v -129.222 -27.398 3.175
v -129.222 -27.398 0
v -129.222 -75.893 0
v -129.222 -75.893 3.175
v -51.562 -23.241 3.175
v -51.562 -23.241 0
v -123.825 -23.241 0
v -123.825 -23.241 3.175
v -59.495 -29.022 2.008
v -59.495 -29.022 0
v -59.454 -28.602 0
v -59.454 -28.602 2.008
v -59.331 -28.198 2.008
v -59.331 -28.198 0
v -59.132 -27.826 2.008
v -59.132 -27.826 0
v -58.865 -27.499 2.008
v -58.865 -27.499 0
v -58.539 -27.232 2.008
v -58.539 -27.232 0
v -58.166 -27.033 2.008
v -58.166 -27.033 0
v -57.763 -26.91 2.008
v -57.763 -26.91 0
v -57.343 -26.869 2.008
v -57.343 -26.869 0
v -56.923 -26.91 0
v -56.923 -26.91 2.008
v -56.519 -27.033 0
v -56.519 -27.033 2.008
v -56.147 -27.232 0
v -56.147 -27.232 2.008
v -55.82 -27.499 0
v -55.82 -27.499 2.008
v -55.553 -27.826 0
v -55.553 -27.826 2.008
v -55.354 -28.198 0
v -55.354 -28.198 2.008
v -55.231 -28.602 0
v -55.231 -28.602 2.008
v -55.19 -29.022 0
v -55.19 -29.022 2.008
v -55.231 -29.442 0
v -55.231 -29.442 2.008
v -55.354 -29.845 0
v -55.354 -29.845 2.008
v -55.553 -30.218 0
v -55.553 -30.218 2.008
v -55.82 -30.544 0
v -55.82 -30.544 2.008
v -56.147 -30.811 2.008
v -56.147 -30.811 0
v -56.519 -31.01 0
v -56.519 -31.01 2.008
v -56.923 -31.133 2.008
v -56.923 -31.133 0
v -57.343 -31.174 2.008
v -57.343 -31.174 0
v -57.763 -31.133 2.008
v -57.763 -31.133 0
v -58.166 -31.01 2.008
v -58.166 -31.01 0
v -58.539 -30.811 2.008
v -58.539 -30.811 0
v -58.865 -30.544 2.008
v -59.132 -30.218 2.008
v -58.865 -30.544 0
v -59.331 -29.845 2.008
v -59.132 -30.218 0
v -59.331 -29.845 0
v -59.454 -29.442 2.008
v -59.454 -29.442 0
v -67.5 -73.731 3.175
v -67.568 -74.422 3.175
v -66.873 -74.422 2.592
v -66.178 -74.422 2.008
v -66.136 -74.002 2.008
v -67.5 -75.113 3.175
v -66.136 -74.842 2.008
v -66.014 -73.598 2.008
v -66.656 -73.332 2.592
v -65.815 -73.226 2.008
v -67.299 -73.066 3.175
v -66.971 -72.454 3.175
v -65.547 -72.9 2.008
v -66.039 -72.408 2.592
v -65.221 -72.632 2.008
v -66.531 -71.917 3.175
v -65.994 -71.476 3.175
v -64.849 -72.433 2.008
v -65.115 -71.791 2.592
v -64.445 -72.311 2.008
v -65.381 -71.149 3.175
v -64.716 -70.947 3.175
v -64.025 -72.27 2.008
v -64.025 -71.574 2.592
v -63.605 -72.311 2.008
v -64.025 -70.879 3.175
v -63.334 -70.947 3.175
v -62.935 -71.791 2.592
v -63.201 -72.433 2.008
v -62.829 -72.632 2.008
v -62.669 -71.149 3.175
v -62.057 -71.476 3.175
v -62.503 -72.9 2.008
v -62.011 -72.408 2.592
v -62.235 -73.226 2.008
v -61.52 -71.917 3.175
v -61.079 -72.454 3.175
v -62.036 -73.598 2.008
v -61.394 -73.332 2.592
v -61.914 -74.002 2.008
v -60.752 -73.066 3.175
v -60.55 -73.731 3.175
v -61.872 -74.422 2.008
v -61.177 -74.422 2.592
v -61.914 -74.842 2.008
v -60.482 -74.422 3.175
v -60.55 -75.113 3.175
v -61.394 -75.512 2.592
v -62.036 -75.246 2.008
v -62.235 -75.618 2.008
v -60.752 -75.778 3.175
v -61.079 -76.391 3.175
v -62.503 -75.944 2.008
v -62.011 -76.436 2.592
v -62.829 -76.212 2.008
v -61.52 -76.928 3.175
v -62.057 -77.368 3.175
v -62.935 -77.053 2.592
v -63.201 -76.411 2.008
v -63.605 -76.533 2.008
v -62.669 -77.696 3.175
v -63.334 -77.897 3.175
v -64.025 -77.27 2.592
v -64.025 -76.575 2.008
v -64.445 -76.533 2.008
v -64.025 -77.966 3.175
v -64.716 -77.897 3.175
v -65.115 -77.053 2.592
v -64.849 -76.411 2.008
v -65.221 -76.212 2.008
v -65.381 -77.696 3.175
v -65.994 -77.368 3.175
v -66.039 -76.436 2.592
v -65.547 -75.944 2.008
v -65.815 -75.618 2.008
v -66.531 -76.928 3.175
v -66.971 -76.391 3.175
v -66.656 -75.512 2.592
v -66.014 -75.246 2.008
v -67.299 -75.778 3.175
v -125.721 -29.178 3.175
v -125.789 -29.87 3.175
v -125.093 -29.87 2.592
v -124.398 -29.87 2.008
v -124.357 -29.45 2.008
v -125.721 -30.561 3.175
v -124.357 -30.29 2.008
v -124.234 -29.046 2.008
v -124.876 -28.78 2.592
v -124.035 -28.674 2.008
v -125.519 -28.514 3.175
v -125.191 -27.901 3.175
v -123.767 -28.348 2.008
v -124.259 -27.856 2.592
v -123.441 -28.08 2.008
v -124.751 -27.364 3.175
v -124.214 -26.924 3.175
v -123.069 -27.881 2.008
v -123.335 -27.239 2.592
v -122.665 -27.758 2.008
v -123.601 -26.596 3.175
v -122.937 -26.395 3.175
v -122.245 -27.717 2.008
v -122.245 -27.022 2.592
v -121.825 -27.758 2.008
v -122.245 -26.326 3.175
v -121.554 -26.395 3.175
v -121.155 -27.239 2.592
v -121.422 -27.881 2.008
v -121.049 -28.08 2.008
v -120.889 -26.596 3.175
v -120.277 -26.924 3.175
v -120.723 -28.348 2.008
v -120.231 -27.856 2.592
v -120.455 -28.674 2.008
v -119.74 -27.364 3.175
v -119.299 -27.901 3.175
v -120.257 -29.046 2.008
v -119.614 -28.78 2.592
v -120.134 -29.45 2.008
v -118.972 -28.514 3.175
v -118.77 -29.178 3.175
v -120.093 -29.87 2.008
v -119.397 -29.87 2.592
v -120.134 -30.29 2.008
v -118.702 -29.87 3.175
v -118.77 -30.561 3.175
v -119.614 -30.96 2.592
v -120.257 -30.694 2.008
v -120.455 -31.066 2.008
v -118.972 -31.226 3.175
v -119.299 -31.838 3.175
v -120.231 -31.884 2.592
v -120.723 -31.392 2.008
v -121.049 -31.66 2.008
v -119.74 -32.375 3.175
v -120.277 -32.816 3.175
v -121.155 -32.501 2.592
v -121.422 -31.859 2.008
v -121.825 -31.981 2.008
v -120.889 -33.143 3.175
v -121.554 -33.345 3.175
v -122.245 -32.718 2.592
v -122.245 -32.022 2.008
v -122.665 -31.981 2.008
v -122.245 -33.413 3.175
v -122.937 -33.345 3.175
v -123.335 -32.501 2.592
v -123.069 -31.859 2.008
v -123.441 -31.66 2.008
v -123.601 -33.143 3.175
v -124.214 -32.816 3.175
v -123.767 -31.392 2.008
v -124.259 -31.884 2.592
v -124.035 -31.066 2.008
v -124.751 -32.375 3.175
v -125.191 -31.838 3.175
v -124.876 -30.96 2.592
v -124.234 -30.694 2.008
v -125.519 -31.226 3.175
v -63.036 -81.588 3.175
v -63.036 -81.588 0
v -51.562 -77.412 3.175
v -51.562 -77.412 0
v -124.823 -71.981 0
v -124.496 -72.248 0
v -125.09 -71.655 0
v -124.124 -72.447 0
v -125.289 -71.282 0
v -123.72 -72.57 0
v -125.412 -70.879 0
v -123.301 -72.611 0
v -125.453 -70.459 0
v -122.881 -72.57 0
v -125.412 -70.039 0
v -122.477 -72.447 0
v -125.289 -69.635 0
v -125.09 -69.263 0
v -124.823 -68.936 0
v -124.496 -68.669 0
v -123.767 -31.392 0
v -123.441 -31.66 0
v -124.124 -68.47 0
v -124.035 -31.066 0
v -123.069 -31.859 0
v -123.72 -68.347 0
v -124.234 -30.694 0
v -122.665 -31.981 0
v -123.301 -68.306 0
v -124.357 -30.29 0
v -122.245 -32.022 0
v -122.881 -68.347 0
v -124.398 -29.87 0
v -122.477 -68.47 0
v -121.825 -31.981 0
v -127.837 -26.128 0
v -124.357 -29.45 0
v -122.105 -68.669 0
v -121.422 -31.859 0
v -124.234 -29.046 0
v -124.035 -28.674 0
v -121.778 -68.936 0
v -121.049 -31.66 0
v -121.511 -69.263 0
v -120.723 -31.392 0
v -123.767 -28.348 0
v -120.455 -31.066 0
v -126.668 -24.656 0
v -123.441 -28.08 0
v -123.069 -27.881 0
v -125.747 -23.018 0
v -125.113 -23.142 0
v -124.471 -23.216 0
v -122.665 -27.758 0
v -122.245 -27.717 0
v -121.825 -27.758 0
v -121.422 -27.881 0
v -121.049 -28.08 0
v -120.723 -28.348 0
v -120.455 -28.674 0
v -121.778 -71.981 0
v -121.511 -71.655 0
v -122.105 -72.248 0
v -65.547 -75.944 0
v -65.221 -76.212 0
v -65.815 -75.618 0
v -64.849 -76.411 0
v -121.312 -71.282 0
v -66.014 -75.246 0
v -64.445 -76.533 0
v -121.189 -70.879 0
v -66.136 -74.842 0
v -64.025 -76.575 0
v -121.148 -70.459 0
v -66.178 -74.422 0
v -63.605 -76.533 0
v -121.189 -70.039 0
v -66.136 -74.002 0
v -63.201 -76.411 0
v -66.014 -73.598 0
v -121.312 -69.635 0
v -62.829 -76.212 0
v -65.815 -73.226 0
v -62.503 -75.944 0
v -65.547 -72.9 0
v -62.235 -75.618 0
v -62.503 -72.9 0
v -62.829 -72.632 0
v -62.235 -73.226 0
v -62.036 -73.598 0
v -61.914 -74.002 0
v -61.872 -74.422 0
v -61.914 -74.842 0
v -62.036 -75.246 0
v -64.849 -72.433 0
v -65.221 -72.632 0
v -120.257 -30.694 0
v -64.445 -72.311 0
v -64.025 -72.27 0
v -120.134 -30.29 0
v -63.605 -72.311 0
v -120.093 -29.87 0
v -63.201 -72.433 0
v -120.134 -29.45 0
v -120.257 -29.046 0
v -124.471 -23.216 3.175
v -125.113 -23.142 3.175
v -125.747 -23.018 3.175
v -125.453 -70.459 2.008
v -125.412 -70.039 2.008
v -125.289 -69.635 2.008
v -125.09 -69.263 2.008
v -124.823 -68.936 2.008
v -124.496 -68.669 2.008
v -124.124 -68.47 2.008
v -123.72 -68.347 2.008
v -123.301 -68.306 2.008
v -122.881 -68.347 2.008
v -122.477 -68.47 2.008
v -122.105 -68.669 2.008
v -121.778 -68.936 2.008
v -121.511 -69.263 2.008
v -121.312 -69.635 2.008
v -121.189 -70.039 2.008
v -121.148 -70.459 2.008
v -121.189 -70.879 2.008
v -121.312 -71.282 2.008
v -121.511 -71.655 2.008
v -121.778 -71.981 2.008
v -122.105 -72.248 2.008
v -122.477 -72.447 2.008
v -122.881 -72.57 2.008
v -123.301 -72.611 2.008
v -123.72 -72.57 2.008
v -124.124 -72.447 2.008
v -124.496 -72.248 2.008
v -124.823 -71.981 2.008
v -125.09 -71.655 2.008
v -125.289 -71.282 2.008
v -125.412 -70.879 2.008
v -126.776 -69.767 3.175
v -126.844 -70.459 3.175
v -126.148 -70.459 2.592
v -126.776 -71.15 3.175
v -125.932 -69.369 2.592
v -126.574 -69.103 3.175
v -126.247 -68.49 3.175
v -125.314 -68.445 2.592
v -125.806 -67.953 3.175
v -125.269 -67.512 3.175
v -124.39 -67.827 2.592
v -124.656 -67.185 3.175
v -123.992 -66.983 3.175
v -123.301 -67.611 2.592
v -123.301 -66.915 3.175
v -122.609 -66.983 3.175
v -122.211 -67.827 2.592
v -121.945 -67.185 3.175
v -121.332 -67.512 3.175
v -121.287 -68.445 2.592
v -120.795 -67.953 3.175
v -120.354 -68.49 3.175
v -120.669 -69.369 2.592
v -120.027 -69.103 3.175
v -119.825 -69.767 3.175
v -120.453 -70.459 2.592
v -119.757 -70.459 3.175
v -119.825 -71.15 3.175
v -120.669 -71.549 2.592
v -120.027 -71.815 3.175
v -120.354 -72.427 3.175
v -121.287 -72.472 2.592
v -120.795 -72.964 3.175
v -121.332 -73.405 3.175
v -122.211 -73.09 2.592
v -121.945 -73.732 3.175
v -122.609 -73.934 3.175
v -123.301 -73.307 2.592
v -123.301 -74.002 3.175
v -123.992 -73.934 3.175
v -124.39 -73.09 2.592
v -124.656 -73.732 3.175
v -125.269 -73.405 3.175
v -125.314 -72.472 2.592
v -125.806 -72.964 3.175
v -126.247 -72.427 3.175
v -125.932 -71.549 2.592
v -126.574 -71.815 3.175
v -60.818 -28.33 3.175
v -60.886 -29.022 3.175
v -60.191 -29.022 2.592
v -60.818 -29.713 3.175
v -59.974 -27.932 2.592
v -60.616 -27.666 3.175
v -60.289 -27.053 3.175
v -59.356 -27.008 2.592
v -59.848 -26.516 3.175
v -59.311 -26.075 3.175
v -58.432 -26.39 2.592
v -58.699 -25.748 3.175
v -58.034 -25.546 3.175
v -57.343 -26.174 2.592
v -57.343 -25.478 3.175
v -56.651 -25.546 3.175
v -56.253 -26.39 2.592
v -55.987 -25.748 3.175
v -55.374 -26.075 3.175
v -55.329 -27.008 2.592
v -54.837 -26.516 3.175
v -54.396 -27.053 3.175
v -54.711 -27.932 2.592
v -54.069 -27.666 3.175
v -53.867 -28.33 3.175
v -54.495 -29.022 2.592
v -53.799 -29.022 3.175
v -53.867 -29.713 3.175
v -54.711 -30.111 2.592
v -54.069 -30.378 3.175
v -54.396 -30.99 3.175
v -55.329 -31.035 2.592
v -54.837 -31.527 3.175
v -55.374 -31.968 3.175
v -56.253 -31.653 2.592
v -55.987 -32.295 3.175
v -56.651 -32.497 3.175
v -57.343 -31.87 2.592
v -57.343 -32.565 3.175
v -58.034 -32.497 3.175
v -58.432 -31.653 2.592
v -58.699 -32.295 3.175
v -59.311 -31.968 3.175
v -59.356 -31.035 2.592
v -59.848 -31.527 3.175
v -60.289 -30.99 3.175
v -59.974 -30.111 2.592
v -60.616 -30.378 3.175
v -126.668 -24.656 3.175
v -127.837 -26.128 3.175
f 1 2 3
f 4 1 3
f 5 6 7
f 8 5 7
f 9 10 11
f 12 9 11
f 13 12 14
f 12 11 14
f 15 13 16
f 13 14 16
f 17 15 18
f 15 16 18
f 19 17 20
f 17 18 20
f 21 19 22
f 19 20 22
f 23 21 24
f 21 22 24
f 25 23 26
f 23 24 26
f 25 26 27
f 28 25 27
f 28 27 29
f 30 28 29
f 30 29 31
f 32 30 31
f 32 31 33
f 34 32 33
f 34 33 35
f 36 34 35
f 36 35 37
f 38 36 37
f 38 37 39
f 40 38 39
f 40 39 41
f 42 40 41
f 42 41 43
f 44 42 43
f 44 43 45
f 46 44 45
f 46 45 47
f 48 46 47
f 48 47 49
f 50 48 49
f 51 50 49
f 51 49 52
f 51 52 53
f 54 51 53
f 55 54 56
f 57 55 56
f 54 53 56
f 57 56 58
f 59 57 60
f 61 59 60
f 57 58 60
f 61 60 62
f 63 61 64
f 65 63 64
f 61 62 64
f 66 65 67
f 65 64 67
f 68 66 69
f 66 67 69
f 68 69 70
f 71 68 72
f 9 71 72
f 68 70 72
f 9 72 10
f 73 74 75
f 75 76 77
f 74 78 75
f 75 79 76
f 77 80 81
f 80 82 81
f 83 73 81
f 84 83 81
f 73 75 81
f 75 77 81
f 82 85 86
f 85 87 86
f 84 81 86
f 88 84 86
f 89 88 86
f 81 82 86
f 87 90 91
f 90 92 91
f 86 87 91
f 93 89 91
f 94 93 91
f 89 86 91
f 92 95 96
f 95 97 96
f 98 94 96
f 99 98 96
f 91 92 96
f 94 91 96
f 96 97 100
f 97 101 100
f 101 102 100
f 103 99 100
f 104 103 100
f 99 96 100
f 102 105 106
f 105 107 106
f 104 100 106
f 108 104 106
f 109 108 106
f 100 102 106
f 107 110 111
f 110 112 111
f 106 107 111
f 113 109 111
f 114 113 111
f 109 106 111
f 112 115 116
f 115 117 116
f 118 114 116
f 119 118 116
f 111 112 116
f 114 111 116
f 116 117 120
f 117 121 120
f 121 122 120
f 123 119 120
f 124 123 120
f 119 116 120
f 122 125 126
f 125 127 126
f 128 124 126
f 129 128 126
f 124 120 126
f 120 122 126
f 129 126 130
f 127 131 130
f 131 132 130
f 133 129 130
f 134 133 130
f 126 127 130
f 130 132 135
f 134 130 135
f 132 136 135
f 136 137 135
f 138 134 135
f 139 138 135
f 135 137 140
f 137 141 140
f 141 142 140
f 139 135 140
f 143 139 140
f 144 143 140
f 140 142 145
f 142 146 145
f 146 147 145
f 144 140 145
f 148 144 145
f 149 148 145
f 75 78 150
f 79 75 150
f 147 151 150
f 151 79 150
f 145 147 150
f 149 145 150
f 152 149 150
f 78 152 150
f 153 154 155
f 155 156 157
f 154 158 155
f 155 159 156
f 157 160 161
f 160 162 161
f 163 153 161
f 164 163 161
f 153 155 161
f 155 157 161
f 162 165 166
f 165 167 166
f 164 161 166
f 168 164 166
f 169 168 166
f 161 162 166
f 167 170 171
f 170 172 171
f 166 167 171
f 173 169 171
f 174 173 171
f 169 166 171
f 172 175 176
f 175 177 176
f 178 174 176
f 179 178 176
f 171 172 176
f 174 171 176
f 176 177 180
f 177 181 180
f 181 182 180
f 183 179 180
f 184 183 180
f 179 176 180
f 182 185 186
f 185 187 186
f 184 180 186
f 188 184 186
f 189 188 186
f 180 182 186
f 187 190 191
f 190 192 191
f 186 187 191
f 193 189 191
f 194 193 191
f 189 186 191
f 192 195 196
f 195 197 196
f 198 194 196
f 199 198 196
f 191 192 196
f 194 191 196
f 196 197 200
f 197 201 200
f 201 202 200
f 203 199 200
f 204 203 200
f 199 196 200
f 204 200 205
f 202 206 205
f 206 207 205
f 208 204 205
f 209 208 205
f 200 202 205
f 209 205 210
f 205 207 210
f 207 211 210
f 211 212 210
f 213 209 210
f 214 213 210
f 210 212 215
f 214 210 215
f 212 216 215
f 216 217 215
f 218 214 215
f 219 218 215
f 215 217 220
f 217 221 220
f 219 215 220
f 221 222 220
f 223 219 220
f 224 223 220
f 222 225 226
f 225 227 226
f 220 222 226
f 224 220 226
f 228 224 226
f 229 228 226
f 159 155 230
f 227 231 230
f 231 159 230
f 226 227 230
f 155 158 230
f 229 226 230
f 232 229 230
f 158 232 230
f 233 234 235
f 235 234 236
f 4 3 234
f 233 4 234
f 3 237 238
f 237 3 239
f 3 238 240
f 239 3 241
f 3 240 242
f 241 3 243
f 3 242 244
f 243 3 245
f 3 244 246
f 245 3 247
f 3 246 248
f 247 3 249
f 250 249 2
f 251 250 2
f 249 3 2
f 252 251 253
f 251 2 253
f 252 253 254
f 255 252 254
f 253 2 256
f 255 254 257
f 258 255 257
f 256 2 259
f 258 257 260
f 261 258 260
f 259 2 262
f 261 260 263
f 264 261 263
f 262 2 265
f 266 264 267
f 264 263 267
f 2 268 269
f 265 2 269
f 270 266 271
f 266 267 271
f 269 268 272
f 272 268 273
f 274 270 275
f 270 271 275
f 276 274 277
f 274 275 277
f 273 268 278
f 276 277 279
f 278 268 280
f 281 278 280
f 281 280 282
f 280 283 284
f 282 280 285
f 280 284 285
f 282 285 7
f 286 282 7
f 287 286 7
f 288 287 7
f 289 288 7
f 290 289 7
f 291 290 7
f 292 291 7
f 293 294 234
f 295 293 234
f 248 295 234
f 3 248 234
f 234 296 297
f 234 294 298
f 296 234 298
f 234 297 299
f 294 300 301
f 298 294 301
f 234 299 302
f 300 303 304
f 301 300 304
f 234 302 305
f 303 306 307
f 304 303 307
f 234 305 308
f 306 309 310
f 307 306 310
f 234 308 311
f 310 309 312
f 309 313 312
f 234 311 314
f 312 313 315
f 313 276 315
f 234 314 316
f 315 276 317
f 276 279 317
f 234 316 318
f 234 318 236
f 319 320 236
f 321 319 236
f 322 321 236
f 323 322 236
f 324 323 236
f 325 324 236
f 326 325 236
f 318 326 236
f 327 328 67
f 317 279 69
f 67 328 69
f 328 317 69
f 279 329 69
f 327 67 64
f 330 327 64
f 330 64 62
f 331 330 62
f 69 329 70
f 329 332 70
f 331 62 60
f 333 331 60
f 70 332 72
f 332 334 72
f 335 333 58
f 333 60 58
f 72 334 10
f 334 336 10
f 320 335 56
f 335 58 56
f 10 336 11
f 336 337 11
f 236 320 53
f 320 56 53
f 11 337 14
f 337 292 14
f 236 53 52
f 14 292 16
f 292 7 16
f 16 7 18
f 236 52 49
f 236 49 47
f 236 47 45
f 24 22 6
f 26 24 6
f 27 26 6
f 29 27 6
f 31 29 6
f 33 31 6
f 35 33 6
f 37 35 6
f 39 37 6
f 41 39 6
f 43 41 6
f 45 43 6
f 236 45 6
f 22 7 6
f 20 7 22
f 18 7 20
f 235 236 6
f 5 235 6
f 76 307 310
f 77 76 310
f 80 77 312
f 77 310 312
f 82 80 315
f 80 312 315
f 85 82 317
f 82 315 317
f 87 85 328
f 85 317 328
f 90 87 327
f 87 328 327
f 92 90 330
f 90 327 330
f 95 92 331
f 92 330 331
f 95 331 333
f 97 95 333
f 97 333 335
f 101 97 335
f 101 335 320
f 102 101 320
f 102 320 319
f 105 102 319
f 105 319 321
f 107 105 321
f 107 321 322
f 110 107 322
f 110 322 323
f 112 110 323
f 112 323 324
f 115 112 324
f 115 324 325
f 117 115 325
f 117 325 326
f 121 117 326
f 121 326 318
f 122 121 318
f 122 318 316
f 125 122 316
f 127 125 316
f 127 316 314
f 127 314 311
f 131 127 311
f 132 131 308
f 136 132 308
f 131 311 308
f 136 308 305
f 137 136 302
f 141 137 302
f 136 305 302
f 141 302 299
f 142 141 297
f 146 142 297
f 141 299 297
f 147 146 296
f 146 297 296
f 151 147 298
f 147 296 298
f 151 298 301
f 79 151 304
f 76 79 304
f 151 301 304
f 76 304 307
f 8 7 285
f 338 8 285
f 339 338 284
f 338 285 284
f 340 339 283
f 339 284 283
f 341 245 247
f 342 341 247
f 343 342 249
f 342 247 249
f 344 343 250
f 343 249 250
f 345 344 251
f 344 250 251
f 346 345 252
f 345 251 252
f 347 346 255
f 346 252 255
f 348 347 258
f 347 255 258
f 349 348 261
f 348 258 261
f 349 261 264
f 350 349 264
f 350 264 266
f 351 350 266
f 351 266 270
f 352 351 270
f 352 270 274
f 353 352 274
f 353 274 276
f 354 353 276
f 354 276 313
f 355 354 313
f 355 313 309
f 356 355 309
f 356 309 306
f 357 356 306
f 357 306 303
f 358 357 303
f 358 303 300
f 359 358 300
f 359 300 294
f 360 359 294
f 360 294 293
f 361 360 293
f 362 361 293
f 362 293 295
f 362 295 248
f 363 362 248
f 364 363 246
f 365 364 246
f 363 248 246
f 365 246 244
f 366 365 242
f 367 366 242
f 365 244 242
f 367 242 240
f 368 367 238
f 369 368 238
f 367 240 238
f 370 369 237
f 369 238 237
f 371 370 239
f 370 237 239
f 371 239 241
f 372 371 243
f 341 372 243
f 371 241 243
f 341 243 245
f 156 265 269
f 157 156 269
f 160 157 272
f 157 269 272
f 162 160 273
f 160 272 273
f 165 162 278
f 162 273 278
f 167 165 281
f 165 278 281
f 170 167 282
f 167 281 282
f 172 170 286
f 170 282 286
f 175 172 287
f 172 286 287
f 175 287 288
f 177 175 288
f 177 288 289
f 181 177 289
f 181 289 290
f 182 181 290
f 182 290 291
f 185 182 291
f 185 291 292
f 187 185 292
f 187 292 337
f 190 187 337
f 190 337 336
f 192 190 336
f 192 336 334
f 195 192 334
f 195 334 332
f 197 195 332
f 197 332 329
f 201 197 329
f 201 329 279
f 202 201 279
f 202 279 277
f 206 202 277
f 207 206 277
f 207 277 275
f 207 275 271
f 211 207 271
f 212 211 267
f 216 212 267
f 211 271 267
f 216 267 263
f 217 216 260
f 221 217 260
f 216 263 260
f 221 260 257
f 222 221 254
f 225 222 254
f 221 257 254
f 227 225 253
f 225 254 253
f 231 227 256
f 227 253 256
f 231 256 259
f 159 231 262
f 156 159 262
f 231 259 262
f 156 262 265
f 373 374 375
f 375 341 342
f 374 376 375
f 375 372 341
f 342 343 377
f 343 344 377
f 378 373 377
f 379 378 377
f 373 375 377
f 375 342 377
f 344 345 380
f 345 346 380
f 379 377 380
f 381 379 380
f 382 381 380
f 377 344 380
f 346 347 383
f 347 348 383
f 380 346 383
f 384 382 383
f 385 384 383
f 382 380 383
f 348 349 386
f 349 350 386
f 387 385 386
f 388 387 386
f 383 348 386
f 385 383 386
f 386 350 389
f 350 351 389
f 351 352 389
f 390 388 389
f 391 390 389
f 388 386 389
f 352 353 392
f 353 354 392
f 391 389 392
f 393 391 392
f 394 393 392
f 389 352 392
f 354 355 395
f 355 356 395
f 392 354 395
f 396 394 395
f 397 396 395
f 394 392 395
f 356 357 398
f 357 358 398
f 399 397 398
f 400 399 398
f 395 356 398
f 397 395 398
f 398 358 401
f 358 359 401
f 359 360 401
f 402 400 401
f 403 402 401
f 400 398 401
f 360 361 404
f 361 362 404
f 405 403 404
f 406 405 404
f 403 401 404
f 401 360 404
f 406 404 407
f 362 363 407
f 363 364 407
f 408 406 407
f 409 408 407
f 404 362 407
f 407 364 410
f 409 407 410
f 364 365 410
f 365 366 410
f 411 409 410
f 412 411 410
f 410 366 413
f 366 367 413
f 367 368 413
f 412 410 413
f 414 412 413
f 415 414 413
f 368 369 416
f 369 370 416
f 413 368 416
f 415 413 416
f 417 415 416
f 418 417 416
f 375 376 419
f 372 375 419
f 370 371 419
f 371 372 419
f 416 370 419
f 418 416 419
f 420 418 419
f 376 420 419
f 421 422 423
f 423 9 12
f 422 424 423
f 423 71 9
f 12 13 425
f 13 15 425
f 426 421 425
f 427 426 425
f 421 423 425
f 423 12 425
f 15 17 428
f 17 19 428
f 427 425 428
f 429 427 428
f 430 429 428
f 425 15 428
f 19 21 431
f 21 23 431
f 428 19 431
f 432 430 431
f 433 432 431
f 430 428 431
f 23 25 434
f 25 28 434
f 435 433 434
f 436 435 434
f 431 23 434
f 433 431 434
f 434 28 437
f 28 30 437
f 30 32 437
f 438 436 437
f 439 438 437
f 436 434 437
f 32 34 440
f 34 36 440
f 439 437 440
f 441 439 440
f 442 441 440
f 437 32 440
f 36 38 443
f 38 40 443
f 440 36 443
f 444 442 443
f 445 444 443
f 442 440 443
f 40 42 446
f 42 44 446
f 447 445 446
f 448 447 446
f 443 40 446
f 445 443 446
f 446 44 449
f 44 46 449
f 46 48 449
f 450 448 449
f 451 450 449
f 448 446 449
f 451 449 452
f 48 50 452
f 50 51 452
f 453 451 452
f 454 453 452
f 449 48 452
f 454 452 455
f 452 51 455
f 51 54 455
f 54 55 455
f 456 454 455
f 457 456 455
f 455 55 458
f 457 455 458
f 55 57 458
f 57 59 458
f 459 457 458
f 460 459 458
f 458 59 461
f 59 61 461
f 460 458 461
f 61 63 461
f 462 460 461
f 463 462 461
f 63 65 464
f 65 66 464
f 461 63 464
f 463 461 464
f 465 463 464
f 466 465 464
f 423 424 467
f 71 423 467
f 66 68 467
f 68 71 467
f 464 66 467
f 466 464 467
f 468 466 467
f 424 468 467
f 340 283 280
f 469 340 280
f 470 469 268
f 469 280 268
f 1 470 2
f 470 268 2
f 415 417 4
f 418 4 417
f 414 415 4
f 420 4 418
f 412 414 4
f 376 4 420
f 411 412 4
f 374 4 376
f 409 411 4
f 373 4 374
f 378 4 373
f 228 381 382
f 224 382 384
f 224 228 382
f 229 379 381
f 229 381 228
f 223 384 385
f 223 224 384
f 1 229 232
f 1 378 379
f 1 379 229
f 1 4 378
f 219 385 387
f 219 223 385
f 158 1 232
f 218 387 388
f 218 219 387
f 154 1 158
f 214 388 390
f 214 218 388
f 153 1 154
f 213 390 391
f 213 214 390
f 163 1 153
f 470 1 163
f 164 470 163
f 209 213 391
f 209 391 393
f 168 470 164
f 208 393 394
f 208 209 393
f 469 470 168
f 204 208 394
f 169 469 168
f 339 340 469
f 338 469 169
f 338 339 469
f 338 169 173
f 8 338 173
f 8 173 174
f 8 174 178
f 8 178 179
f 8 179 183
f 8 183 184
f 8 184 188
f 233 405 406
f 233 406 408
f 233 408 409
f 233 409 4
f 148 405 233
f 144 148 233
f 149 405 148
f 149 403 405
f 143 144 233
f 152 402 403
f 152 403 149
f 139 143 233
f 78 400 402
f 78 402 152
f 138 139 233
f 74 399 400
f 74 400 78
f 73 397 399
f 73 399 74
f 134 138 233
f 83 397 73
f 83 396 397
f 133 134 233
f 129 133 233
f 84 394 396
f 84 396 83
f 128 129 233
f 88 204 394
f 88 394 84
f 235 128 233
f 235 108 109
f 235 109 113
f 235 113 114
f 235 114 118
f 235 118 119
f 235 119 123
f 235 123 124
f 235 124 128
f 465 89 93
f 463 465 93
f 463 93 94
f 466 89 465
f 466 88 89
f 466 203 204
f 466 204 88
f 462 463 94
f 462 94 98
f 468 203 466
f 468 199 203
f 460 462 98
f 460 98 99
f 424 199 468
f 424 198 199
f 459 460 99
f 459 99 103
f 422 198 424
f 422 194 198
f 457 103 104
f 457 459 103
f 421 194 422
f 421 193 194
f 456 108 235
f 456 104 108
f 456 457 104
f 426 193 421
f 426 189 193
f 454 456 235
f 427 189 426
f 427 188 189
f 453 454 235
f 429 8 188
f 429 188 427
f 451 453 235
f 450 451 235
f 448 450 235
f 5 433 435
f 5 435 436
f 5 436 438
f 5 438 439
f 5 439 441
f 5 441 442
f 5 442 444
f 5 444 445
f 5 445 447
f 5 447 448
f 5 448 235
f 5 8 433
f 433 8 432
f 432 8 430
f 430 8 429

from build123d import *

# Parameters (mm, degrees)
BOSS_EXTRUDE1_DEPTH                               = 3.175
CSK_FOR_6_FLAT_HEAD_MACHINE_SCREW_100_D           = 4.3053
CSK_FOR_6_FLAT_HEAD_MACHINE_SCREW_100_DEPTH       = 3.175
CSK_FOR_6_FLAT_HEAD_MACHINE_SCREW_100_CSINK_D     = 7.0866
CSK_FOR_6_FLAT_HEAD_MACHINE_SCREW_100_CSINK_ANGLE = 100


with BuildPart() as part:
    # Sketch1 → Boss-Extrude1 (new body)
    with BuildSketch(Plane.XY):
        with BuildLine():
            Line((-129.2225, -27.397612764), (-129.2225, -75.892938058))
            Line((-129.2225, -75.892938058), (-63.036003441, -81.587899176))
            Line((-63.036003441, -81.587899176), (-51.562, -77.411703455))
            Line((-51.562, -77.411703455), (-51.562, -23.241))
            Line((-51.562, -23.241), (-123.825, -23.241))
            ThreePointArc((-123.825, -23.241), (-124.792433255, -23.184983239), (-125.746935831, -23.017681674))
            ThreePointArc((-125.746935831, -23.017681674), (-127.22324483, -25.415131417), (-129.2225, -27.397612764))
        make_face()
    extrude(amount=BOSS_EXTRUDE1_DEPTH)

    # CSK for #6 Flat Head Machine Screw (100)1
    with Locations(Plane.XY.offset(3.175)):
        with Locations((-123.300524074, -70.458632008), (-122.245302558, -29.869734201), (-57.342596045, -29.021596045), (-64.02512283, -74.422207293)):
            CounterSinkHole(CSK_FOR_6_FLAT_HEAD_MACHINE_SCREW_100_D / 2, CSK_FOR_6_FLAT_HEAD_MACHINE_SCREW_100_CSINK_D / 2, depth=CSK_FOR_6_FLAT_HEAD_MACHINE_SCREW_100_DEPTH, counter_sink_angle=CSK_FOR_6_FLAT_HEAD_MACHINE_SCREW_100_CSINK_ANGLE)


solid = part.part
